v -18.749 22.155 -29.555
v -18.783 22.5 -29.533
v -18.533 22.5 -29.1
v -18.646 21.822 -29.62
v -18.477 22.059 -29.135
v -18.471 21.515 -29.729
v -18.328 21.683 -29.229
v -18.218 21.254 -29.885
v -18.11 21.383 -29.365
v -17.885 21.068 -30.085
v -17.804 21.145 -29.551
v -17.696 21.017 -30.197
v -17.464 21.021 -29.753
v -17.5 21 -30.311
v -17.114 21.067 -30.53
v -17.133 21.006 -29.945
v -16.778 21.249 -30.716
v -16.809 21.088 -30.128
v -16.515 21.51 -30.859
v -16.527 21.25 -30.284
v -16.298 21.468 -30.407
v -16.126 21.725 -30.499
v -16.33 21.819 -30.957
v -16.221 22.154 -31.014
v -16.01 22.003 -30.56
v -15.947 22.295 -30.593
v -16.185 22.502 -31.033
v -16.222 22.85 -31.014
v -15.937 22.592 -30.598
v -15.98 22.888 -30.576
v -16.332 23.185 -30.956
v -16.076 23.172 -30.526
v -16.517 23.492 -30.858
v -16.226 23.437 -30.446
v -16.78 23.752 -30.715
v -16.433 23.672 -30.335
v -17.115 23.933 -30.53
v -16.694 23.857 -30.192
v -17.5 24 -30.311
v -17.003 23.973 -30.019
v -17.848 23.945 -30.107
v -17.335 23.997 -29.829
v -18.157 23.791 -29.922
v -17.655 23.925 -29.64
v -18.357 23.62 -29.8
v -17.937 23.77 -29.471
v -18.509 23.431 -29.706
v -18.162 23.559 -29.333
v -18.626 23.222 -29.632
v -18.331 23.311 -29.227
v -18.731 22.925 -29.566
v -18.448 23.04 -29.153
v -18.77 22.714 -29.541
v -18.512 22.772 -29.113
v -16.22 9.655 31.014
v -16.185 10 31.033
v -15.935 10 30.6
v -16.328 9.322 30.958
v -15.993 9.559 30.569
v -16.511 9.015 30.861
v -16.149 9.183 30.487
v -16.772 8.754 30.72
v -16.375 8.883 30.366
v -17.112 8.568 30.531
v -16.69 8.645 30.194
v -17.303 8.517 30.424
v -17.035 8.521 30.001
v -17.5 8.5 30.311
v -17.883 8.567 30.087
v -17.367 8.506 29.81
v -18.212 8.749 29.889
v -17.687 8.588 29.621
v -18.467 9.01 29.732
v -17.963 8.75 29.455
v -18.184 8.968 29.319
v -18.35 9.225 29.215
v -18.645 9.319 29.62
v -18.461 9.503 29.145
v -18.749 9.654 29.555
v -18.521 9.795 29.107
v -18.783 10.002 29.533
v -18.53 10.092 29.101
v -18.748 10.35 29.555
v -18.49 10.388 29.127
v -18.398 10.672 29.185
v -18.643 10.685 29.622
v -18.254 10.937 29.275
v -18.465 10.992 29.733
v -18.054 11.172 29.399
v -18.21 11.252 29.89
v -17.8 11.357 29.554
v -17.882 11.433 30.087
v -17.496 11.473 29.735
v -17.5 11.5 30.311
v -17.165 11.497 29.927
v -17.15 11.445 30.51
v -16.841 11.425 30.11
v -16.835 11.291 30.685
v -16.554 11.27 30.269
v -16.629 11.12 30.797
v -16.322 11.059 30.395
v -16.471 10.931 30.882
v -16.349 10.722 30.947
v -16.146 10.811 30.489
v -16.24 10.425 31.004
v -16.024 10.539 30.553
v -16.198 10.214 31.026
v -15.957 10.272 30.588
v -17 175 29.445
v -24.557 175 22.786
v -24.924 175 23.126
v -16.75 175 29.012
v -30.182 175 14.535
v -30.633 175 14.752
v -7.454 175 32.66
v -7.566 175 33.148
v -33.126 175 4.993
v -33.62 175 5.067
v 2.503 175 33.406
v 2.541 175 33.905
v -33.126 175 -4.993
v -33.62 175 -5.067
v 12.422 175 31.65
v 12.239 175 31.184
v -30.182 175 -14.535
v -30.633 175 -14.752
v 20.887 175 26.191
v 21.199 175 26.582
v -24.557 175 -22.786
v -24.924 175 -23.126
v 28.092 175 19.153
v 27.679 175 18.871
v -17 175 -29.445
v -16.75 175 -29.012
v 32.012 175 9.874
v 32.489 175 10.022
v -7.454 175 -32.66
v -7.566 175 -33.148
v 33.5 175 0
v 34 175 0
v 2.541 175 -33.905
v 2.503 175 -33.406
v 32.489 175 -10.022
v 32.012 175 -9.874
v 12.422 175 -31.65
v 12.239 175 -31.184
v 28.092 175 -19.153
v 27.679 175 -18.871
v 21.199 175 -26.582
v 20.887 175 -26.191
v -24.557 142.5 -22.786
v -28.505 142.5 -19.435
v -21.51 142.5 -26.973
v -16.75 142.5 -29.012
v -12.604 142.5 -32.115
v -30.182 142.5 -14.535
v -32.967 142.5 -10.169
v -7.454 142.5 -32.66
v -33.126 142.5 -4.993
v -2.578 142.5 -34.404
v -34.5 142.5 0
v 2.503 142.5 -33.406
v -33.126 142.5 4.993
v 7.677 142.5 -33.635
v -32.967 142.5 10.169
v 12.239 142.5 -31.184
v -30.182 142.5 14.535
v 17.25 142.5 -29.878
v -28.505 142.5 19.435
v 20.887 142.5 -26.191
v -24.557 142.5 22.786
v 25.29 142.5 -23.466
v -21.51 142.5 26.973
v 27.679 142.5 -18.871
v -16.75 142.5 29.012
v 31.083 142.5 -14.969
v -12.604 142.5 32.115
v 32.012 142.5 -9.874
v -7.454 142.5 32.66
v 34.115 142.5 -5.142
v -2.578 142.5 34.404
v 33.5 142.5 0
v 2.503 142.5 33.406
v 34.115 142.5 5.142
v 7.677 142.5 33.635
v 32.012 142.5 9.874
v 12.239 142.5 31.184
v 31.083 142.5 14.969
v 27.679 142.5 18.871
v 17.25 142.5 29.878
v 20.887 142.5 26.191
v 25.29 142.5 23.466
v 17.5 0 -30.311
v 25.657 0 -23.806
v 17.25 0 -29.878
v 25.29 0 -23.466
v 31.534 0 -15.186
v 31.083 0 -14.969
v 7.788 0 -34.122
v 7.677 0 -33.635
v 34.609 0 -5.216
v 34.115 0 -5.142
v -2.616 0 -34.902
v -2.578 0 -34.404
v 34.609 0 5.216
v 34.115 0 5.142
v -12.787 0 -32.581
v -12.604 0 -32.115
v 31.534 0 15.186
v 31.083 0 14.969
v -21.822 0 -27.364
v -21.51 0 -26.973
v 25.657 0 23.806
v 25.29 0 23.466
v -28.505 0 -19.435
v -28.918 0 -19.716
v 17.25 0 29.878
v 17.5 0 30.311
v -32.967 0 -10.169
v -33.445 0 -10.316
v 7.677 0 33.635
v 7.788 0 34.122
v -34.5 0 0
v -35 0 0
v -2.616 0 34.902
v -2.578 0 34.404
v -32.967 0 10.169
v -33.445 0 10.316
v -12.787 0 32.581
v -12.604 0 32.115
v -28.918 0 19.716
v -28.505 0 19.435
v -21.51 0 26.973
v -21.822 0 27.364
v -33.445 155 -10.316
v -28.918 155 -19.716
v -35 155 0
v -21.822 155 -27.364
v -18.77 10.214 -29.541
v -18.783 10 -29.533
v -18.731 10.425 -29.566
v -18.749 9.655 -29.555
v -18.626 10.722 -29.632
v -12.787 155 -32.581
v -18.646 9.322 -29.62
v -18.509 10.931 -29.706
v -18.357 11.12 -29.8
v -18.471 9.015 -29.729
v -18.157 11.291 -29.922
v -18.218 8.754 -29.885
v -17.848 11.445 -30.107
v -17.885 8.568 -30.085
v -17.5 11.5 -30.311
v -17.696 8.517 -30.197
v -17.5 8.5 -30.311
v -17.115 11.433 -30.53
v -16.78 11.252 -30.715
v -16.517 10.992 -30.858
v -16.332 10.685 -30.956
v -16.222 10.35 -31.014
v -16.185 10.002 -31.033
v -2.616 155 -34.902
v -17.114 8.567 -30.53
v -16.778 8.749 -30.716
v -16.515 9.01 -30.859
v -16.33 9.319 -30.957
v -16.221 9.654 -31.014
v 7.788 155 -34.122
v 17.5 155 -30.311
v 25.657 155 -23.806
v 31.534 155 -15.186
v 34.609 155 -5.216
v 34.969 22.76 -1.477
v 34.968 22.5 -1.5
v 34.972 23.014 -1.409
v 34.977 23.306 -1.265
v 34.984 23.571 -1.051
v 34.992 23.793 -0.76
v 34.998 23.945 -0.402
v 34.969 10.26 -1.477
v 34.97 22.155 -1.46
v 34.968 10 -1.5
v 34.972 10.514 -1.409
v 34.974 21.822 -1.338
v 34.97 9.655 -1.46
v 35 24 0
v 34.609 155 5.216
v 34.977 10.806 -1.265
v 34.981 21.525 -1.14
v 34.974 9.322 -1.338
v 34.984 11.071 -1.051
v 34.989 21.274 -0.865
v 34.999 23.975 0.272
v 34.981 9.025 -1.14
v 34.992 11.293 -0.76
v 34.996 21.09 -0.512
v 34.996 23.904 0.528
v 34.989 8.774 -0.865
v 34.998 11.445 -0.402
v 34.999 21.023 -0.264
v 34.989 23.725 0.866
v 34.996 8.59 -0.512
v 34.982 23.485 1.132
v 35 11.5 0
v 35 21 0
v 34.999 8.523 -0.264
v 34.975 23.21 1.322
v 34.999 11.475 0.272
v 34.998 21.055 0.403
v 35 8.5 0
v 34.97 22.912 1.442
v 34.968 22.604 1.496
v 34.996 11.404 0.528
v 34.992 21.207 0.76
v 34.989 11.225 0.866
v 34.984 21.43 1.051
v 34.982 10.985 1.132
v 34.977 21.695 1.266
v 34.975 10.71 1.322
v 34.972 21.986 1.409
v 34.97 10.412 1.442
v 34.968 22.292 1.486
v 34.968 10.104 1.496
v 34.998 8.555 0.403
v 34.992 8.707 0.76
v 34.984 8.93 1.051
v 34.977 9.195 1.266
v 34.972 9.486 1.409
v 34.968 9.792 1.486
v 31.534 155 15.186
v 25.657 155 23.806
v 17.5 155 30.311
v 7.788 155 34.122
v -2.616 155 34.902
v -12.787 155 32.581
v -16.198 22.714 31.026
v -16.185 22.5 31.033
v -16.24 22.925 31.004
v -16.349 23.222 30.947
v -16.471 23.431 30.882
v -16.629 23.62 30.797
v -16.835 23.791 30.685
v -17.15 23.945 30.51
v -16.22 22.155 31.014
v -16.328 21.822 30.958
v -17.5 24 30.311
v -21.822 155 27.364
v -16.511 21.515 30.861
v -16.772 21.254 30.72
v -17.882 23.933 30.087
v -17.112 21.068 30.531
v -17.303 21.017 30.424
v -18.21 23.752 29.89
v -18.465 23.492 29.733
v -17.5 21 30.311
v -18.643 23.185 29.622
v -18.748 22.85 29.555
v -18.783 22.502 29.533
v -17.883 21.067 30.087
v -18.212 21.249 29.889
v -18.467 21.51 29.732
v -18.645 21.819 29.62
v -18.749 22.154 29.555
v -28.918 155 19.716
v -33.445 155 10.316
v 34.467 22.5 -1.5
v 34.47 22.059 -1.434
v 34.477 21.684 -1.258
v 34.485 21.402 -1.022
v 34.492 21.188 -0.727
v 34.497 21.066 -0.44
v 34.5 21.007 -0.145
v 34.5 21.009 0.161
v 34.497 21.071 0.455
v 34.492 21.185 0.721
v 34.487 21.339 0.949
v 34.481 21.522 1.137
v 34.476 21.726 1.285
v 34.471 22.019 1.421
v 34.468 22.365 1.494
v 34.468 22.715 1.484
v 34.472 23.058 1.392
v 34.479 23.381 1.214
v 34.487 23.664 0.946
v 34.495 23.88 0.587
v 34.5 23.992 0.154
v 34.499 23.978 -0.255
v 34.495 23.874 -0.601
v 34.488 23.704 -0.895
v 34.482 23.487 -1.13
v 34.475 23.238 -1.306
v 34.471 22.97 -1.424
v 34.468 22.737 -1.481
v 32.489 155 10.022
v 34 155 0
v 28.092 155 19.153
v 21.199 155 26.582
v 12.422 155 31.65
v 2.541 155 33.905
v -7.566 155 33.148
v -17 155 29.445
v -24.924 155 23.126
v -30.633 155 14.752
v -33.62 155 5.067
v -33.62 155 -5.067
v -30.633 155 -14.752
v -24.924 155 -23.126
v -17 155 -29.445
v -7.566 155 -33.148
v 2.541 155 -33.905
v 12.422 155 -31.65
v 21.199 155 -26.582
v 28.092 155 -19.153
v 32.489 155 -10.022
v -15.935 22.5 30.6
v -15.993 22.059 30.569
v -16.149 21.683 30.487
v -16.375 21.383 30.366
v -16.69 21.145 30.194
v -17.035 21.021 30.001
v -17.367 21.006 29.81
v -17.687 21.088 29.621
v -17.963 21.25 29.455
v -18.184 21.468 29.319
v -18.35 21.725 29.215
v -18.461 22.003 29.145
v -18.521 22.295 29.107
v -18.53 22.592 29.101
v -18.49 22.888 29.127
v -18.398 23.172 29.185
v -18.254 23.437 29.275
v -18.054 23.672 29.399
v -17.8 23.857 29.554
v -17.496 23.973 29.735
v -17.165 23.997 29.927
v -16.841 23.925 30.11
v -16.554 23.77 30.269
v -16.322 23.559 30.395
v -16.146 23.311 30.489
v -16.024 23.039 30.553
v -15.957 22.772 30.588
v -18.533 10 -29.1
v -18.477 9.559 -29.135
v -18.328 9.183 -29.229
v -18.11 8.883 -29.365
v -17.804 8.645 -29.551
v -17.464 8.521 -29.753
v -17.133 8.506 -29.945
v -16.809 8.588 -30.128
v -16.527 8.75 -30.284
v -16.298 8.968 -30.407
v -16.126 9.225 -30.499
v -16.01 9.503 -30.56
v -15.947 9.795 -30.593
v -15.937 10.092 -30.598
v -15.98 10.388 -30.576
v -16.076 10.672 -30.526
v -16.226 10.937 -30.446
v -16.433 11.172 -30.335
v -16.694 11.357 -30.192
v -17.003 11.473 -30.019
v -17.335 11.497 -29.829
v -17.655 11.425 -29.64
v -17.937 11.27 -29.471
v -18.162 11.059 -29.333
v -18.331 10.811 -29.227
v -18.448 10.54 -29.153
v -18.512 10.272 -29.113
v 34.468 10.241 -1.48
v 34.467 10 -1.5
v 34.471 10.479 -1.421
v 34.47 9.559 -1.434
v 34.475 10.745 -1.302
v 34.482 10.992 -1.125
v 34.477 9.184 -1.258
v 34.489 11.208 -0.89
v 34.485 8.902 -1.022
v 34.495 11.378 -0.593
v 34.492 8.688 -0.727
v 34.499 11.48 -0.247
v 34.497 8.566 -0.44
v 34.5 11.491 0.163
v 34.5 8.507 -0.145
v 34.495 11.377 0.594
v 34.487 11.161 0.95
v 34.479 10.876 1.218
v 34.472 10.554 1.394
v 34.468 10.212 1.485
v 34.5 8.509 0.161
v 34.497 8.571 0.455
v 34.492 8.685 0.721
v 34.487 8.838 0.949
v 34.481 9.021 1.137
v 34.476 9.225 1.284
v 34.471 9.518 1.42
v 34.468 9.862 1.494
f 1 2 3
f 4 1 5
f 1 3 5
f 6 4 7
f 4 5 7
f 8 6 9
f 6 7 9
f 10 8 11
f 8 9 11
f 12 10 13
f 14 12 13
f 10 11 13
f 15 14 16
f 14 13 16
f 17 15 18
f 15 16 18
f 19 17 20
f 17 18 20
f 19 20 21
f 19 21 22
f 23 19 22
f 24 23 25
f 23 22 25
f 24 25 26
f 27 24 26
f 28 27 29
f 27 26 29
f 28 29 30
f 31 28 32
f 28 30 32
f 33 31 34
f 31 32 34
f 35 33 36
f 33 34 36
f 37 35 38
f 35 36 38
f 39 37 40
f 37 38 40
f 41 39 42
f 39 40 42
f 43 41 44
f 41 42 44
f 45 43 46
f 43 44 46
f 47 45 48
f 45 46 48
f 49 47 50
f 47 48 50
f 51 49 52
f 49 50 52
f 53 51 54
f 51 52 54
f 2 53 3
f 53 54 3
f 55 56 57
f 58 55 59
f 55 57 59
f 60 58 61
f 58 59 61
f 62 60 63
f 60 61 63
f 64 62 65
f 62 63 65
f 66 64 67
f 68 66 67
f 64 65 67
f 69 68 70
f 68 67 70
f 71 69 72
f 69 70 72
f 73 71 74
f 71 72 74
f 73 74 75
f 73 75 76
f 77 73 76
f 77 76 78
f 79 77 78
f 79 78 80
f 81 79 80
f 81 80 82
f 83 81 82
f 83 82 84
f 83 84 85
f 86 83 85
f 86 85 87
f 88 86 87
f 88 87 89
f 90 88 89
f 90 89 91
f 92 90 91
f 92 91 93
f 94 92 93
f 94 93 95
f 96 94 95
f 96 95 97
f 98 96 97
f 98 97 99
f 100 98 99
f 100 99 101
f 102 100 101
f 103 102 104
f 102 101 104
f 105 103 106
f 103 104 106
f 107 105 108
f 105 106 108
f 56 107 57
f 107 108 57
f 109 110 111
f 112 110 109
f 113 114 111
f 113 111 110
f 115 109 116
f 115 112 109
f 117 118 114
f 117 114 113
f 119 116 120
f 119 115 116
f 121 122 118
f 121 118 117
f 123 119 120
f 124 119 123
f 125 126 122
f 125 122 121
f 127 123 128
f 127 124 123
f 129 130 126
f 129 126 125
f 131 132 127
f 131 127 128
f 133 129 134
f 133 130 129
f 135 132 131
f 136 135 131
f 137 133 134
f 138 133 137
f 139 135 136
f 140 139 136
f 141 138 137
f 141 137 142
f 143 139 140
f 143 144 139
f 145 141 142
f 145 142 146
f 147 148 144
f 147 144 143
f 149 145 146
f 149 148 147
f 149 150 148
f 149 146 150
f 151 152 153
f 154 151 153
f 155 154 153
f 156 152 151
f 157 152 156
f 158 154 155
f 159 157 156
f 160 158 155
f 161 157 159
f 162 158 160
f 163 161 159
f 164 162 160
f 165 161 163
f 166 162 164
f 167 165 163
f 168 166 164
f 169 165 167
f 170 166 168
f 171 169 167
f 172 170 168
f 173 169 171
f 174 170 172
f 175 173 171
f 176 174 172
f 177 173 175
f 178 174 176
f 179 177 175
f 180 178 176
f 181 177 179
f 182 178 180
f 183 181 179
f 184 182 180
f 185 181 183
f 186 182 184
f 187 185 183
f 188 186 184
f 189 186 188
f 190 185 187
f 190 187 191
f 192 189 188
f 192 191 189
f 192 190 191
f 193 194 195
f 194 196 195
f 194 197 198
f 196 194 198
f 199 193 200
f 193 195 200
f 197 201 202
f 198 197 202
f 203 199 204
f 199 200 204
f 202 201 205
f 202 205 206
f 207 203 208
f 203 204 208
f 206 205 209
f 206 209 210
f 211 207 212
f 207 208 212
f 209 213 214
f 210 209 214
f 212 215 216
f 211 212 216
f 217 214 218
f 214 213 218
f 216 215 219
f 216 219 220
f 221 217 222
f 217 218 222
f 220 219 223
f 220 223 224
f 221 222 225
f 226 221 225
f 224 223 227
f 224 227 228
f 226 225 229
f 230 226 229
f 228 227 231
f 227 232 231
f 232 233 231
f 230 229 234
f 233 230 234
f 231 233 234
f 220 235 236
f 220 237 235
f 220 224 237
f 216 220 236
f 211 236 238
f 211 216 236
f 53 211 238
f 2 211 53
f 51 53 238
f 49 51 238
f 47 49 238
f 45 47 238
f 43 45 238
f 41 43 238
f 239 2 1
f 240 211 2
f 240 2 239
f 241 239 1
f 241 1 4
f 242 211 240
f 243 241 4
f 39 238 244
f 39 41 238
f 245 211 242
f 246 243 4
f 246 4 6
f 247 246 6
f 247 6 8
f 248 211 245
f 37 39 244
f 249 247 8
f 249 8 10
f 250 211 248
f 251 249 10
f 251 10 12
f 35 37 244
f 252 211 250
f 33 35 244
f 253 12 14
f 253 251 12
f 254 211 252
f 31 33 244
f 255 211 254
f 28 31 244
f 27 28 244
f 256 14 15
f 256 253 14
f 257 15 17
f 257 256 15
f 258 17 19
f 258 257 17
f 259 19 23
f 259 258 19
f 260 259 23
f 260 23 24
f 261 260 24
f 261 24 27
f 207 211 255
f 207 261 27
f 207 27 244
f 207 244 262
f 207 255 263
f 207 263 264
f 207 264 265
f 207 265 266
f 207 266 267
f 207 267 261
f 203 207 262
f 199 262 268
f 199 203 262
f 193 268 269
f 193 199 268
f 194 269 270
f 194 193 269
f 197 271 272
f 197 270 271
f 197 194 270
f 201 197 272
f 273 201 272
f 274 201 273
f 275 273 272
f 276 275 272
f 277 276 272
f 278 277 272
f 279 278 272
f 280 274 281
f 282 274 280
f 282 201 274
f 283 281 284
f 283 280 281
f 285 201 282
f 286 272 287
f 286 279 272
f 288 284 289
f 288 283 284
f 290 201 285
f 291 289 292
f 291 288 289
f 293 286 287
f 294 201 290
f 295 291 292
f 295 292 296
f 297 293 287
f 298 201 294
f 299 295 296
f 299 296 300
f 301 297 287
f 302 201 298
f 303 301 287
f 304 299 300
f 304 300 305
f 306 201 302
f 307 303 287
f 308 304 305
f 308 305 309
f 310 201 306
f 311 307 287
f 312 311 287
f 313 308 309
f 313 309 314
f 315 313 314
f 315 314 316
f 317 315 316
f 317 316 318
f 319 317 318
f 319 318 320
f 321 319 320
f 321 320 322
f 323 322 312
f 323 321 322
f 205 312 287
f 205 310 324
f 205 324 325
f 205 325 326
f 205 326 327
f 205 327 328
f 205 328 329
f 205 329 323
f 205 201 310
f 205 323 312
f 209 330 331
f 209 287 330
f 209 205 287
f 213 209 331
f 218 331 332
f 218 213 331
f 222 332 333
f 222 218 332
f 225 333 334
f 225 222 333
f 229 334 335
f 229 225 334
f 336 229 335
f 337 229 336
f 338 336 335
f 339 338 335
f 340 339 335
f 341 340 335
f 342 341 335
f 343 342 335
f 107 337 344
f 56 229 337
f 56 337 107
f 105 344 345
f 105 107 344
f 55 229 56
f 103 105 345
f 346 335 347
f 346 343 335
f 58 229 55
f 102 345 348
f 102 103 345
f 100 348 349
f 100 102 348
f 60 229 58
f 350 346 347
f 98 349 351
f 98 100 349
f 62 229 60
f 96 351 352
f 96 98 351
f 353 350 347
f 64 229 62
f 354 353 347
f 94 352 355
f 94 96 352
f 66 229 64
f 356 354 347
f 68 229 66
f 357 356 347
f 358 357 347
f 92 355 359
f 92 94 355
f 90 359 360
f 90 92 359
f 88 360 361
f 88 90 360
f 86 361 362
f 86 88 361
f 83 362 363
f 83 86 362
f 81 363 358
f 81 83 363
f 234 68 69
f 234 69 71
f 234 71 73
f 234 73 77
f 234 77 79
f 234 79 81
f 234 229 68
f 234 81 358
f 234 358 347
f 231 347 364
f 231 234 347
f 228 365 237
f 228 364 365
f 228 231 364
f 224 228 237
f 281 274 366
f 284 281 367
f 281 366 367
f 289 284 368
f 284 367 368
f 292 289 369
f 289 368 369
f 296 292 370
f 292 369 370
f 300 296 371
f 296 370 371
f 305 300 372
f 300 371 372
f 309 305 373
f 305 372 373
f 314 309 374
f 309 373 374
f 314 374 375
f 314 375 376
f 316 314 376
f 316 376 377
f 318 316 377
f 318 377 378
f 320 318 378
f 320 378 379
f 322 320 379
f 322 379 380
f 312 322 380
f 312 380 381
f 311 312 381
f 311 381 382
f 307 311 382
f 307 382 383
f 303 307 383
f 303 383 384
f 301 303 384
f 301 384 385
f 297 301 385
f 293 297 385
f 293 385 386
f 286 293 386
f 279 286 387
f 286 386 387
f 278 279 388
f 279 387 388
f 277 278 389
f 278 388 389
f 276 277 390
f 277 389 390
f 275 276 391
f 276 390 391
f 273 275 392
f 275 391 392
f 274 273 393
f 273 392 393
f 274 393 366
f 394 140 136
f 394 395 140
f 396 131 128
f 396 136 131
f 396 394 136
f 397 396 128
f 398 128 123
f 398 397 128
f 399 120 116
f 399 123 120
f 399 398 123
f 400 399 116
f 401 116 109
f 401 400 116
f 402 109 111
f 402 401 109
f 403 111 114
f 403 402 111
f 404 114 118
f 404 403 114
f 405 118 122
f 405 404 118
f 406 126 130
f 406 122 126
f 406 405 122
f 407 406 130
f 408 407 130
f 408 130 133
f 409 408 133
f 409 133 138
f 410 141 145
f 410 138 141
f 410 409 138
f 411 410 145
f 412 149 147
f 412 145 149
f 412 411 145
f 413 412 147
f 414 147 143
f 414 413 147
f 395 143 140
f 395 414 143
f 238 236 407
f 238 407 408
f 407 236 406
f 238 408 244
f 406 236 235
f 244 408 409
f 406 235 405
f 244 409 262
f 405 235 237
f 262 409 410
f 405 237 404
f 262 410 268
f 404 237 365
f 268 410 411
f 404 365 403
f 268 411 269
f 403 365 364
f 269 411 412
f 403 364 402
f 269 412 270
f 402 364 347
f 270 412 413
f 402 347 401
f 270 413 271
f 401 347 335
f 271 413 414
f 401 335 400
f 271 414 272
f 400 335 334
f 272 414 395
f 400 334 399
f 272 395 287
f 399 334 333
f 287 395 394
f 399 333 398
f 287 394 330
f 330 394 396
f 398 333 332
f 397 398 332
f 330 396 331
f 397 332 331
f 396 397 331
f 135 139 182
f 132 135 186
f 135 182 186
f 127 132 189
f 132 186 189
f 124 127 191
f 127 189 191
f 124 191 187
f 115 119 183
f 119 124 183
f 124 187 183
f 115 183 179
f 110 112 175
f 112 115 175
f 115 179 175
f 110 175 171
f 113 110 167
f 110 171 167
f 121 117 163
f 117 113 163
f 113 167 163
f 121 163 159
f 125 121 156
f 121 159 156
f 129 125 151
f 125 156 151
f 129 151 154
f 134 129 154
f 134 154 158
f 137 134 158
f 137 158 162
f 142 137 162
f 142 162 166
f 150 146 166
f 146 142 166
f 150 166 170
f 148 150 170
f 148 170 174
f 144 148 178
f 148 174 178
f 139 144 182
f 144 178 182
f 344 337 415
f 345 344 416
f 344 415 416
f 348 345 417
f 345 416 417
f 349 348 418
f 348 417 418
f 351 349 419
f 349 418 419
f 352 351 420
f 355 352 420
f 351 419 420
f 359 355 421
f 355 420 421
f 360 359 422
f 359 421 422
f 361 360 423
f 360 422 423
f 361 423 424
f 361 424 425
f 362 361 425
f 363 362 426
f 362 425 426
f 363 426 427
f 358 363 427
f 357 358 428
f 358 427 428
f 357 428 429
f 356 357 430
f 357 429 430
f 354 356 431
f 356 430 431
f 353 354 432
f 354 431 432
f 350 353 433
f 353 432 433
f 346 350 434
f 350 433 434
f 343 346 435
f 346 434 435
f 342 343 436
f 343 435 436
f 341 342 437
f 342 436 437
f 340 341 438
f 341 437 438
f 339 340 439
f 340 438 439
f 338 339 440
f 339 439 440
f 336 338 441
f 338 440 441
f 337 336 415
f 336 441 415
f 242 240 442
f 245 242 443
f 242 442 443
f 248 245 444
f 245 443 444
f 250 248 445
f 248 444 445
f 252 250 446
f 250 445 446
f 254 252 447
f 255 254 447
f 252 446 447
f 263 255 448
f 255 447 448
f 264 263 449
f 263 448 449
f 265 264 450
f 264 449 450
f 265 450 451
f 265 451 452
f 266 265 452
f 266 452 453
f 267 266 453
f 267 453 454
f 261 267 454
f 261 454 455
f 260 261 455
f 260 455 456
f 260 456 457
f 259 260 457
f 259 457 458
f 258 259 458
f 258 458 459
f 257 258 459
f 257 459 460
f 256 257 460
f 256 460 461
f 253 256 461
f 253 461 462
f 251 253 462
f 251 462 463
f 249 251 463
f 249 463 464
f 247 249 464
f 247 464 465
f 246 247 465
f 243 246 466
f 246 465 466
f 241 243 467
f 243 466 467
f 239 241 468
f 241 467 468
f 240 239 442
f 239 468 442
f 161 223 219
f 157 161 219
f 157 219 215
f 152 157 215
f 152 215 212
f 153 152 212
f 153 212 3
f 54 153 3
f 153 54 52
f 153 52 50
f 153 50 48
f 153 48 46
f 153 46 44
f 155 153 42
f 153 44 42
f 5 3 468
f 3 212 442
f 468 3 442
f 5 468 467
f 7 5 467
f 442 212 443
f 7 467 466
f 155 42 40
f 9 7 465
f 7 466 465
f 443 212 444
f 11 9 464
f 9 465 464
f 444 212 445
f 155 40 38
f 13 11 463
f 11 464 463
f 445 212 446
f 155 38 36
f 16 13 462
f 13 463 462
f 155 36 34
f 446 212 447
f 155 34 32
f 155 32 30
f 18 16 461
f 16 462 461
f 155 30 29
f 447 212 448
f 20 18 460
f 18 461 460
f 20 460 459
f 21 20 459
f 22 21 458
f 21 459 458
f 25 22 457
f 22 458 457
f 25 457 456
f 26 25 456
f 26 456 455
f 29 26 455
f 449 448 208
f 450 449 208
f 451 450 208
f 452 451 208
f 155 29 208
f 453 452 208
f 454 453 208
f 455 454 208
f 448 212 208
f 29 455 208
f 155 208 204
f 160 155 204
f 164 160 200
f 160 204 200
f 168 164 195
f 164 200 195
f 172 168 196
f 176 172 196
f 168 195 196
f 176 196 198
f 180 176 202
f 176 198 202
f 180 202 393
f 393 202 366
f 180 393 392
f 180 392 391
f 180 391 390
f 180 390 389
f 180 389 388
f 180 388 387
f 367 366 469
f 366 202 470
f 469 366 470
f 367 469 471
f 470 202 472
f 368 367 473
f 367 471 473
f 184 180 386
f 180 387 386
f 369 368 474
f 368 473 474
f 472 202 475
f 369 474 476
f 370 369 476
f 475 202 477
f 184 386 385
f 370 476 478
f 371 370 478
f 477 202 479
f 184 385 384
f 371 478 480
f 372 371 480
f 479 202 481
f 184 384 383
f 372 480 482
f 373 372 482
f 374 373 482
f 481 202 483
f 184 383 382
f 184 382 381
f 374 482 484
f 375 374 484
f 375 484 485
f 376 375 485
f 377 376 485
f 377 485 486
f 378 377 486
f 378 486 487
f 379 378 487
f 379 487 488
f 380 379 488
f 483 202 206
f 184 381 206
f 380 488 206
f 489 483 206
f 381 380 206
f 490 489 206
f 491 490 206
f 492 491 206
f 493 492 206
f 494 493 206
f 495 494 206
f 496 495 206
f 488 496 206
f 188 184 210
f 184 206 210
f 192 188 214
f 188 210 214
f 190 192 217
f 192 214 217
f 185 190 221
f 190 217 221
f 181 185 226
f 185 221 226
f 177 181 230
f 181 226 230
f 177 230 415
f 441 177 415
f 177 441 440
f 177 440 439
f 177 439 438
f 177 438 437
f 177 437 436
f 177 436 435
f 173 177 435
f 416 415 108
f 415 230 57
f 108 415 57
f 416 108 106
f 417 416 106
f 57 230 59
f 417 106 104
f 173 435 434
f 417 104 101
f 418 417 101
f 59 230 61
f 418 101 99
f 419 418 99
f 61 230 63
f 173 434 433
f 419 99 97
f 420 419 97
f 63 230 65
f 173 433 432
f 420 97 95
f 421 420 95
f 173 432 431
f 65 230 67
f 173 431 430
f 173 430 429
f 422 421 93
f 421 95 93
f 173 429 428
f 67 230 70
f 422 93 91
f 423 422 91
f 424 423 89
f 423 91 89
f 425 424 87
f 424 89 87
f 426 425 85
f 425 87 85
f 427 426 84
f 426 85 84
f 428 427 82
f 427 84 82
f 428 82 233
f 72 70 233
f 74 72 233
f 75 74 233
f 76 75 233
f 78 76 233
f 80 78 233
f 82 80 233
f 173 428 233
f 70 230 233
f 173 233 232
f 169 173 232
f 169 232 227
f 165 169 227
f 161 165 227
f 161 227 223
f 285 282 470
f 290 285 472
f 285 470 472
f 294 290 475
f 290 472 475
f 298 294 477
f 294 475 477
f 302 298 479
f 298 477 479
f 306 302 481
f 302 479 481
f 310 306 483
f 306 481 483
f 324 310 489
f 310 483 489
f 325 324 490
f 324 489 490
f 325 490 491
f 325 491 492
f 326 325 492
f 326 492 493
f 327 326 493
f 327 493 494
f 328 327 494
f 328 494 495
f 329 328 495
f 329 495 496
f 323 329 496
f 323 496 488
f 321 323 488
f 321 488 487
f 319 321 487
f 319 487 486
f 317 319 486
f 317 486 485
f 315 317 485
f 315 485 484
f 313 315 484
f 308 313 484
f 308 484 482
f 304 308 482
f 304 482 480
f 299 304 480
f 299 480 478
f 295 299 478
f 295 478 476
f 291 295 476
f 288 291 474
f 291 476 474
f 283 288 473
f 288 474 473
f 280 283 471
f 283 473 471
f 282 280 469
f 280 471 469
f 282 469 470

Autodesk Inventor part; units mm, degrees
ref_plane "XZ Plane" through (0, 0, 0) normal (0, 1, 0) x (-1, 0, 0)
sketch "Sketch1" plane through (0, 0, 0) normal (0, 1, 0) x (-1, 0, 0)
  circle A0 centre (0, 0) radius 35
  circle A1 centre (0, 0) radius 34.5
  dimension "d0" = 70
  dimension "d1" = 69
extrude "Extrusion1" add sketch "Sketch1" along normal blind 155
ref_plane "Work Plane2" through (35, 0, 0) normal (1, 0, 0) x (0, 1, 0)
sketch "Sketch4" plane through (35, 0, 0) normal (1, 0, 0) x (0, 1, 0)
  line L0 (155, -35) -> (155, 35) projected
  point P0 (0, 0)
  point P1 (10, 0)
  dimension "d48" = 10
hole "Hole2" at (35, 10, 0) direction (-1, 0, 0) diameter 3 depth 8 tip angle 118
sketch "Sketch5" plane through (0, 155, 0) normal (0, 1, 0) x (1, 0, 0)
  circle A0 centre (0, 0) radius 34
  circle A1 centre (0, 0) radius 33.5
  dimension "d44" = 68
  dimension "d45" = 67
extrude "Extrusion3" add sketch "Sketch5" along normal blind 20
sketch "Sketch6" plane through (0, 155, 0) normal (0, -1, 0) x (1, 0, 0)
  circle A0 centre (0, 0) radius 33.5
  circle A1 centre (0, 0) radius 34.5 projected
  circle A2 centre (0, 0) radius 35
extrude "Extrusion4" add sketch "Sketch6" along normal blind 12.5 contours A1
ref_plane "Work Plane4" through (34, 0, 0) normal (1, 0, 0) x (0, 1, 0)
pattern_circular "Circular Pattern2" count 3 over 360 about axis through (0, 0, 0) along (0, 1, 0) of "Hole2"
sketch "Sketch10" plane through (35, 0, 0) normal (1, 0, 0) x (0, 1, 0)
  point P0 (0, 0)
  point P1 (22.5, 0)
  dimension "d82" = 22.5
hole "Hole6" at (35, 22.5, 0) direction (-1, 0, 0) diameter 3 depth 8 tip angle 118
pattern_circular "Circular Pattern3" count 3 over 360 about axis through (0, 0, 0) along (0, 1, 0) of "Hole6"
properties part number "Engine skin" material "Plastic, Opaque White"
